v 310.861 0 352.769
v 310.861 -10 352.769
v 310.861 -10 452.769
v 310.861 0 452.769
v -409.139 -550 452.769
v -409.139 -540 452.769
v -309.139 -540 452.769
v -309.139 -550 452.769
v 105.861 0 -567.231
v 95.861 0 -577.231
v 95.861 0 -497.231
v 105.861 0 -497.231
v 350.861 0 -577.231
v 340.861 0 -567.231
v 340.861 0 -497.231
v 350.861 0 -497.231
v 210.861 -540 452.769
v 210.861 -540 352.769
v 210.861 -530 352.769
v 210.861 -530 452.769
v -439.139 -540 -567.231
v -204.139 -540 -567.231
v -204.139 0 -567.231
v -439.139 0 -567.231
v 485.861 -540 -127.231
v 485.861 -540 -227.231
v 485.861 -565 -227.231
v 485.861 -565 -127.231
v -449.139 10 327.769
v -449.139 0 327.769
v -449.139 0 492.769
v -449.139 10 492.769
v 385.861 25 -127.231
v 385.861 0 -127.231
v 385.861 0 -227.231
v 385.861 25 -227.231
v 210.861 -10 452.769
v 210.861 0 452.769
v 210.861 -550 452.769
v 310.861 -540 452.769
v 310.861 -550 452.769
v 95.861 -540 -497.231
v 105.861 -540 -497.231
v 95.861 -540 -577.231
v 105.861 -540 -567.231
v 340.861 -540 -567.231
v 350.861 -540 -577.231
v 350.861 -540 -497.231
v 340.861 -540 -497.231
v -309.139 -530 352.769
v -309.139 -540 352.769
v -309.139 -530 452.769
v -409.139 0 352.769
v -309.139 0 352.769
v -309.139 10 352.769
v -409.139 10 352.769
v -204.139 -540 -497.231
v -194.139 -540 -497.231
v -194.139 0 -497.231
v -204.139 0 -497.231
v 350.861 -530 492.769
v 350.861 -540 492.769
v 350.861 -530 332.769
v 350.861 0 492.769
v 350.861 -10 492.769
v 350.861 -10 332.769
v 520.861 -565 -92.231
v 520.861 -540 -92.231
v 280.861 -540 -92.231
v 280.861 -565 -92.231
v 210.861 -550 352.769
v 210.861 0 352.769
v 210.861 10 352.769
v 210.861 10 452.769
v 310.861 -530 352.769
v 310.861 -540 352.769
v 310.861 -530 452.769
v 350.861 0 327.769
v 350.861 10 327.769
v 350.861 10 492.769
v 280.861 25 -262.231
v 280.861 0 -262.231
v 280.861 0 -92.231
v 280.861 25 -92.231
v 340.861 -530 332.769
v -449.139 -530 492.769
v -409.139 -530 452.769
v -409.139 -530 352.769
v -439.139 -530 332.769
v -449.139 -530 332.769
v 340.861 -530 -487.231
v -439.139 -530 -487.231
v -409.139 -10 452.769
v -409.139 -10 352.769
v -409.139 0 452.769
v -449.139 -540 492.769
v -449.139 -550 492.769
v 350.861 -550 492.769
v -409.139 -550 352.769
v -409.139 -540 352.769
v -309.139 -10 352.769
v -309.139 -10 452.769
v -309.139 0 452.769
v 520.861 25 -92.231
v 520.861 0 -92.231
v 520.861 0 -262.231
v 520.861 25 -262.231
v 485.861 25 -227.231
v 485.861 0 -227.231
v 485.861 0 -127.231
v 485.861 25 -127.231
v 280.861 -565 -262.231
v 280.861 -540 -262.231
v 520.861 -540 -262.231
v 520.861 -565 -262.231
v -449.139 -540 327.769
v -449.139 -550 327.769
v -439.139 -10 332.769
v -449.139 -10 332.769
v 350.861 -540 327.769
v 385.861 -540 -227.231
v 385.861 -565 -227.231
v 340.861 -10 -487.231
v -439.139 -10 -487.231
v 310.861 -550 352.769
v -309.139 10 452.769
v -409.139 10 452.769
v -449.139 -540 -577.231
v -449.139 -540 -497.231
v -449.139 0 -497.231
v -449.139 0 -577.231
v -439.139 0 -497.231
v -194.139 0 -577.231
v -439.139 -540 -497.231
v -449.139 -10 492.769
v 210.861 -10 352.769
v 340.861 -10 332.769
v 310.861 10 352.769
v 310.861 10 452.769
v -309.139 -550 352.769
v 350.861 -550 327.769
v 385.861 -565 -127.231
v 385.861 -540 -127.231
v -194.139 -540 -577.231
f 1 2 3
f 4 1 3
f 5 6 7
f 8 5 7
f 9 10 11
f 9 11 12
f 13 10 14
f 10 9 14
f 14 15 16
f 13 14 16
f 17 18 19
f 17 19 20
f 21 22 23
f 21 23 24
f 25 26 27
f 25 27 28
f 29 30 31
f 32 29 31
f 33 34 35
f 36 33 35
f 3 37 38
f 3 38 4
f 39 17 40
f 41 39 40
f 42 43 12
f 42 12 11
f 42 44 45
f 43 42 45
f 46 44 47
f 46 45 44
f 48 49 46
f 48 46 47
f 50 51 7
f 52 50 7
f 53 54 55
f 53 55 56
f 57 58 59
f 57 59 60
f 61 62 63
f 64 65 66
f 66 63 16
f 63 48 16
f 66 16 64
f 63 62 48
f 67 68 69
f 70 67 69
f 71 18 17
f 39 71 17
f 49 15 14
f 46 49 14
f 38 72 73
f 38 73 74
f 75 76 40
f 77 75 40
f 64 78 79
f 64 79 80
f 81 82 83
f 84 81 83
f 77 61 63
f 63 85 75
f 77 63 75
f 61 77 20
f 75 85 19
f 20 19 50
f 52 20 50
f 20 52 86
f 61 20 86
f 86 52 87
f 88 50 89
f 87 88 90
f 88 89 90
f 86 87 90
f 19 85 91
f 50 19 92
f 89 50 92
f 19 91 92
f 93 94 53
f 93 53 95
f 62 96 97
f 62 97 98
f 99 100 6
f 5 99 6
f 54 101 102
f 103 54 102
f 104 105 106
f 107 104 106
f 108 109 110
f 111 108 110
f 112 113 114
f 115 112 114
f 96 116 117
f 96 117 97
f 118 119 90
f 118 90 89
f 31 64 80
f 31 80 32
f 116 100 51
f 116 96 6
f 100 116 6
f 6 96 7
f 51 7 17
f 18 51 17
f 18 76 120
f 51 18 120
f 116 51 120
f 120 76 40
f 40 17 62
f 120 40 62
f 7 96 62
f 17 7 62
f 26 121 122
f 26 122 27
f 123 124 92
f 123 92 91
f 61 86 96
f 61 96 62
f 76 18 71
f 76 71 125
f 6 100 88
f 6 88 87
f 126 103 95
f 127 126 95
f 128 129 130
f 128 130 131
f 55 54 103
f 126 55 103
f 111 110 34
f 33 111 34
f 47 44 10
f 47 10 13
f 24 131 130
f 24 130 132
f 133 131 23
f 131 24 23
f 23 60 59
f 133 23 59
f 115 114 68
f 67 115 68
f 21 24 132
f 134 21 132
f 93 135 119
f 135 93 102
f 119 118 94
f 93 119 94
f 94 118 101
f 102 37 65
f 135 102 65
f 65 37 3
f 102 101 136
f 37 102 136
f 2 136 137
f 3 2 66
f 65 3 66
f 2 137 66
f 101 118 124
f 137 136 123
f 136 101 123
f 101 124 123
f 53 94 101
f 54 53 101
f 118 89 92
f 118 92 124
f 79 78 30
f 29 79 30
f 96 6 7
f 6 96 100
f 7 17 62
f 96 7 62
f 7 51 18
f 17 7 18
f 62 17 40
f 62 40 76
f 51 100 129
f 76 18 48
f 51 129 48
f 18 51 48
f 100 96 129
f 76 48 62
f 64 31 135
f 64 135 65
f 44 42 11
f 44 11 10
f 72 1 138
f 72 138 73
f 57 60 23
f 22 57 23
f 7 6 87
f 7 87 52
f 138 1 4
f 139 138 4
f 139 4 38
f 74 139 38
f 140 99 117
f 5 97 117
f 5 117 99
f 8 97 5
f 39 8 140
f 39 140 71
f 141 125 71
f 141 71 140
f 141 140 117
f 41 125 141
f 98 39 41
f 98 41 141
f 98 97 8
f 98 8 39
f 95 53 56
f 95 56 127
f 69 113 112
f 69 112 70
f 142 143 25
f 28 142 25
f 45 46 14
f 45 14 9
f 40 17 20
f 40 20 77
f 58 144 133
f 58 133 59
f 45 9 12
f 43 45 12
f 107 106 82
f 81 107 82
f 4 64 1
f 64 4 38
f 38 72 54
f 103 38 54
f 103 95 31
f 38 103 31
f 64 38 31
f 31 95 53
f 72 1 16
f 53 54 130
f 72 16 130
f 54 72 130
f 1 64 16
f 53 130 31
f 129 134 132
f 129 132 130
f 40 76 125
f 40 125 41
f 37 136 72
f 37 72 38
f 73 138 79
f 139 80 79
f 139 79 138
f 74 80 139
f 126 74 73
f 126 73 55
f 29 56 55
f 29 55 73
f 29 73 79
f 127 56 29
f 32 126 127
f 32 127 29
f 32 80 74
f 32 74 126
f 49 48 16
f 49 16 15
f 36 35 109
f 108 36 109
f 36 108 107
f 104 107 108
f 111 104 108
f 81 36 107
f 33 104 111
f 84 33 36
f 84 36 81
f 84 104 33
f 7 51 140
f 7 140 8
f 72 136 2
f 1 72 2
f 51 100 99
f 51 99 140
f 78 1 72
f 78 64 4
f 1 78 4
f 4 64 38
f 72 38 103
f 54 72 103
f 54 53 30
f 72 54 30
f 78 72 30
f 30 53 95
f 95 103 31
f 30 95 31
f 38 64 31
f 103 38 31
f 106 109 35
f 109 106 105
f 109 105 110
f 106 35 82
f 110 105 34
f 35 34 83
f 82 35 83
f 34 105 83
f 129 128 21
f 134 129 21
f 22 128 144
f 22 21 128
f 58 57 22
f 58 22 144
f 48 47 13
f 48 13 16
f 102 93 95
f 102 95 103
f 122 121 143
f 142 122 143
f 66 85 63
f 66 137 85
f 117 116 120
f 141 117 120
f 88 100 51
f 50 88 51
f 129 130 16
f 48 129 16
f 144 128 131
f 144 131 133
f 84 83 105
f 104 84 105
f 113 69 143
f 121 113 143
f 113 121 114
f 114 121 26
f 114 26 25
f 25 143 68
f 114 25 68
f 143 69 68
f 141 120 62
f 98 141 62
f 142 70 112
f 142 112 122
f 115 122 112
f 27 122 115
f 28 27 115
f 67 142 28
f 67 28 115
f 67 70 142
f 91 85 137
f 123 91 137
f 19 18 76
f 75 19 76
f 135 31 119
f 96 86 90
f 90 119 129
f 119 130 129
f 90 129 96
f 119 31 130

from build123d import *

# Parameters (mm, degrees)
F0_W      = 800
F0_H      = 10
F1_DEPTH  = 540
F2_W      = 800
F2_H      = 540
F2_W_2    = 780
F2_H_2    = 520
F3_DEPTH  = 820
F5_DEPTH  = 160
F6_W      = 100
F6_H      = 100
F7_DEPTH  = 918
F8_W      = 800
F8_H      = 165
F8_W_2    = 100
F8_H_2    = 100
F9_DEPTH  = 10
F10_W     = 800
F10_H     = 165
F10_W_2   = 100
F10_H_2   = 100
F11_DEPTH = 10
F13_DEPTH = 540
F14_W     = 70
F14_H     = 170
F15_DEPTH = 25
F16_W     = 70
F16_H     = 170
F16_W_2   = 170
F16_W_3   = 100
F16_H_2   = 100
F17_DEPTH = 25


with BuildPart() as f1:
    # F0 (on Front) → F1 (new body)
    with BuildSketch(Plane.XZ):
        with Locations((-49.139143, -492.230605)):
            Rectangle(F0_W, F0_H)
    extrude(amount=F1_DEPTH)

    # F2 (on face) → F3 (join)
    with BuildSketch(Plane.XY.offset(-487.230605)):
        with Locations((-49.139143, -270)):
            Rectangle(F2_W, F2_H)
        with Locations((-49.139143, -270)):
            Rectangle(F2_W_2, F2_H_2, mode=Mode.SUBTRACT)
    extrude(amount=F3_DEPTH)

    # F4 (on face) → F5 (join)
    with BuildSketch(Plane.XY.offset(332.769395)):
        Polygon((350.860857, 0), (-449.139143, 0), (-449.139143, -10), (-439.139143, -10), (340.860857, -10), (350.860857, -10), align=None)
        Polygon((-439.139143, -530), (-449.139143, -530), (-449.139143, -540), (350.860857, -540), (350.860857, -530), (340.860857, -530), align=None)
    extrude(amount=F5_DEPTH)

    # F6 (on face) → F7 (cut)
    with BuildSketch(Plane.XZ.offset(540)):
        with Locations((-359.139143, 402.769395)):
            Rectangle(F6_W, F6_H)
        with Locations((260.860857, 402.769395)):
            Rectangle(F6_W, F6_H)
    extrude(amount=-F7_DEPTH, mode=Mode.SUBTRACT)


with BuildPart() as f9:
    # F8 (on face) → F9 (new body)
    with BuildSketch(Plane.XZ.offset(540)):
        with Locations((-49.139143, 410.269395)):
            Rectangle(F8_W, F8_H)
        with Locations((-359.139143, 402.769395)):
            Rectangle(F8_W_2, F8_H_2, mode=Mode.SUBTRACT)
        with Locations((260.860857, 402.769395)):
            Rectangle(F8_W_2, F8_H_2, mode=Mode.SUBTRACT)
    extrude(amount=F9_DEPTH)


with BuildPart() as f11:
    # F10 (on face) → F11 (new body)
    with BuildSketch(Plane(origin=(0, 0, 0), x_dir=(-1, 0, 0), z_dir=(0, 1, 0))):
        with Locations((49.139143, 410.269395)):
            Rectangle(F10_W, F10_H)
        with Locations((-260.860857, 402.769395)):
            Rectangle(F10_W_2, F10_H_2, mode=Mode.SUBTRACT)
        with Locations((359.139143, 402.769395)):
            Rectangle(F10_W_2, F10_H_2, mode=Mode.SUBTRACT)
    extrude(amount=F11_DEPTH)


with BuildPart() as f13:
    # F12 (on face) → F13 (new body, through all)
    with BuildSketch(Plane.XZ.offset(540)):
        Polygon((-439.139143, -497.230605), (-449.139143, -497.230605), (-449.139143, -577.230605), (-194.139143, -577.230605), (-194.139143, -497.230605), (-204.139143, -497.230605), (-204.139143, -567.230605), (-439.139143, -567.230605), align=None)
        Polygon((350.860857, -577.230605), (350.860857, -497.230605), (340.860857, -497.230605), (340.860857, -567.230605), (105.860857, -567.230605), (105.860857, -497.230605), (95.860857, -497.230605), (95.860857, -577.230605), align=None)
    extrude(amount=-F13_DEPTH)


with BuildPart() as f15:
    # F14 (on face) → F15 (new body)
    with BuildSketch(Plane(origin=(0, 0, 0), x_dir=(-1, 0, 0), z_dir=(0, 1, 0))):
        Polygon((-520.860857, -262.230605), (-350.860857, -262.230605), (-350.860857, -92.230605), (-435.860857, -92.230605), (-520.860857, -92.230605), align=None)
        Polygon((-485.860857, -127.230605), (-435.860857, -127.230605), (-385.860857, -127.230605), (-385.860857, -177.230605), (-385.860857, -227.230605), (-485.860857, -227.230605), (-485.860857, -177.230605), align=None, mode=Mode.SUBTRACT)
        with Locations((-315.860857, -177.230605)):
            Rectangle(F14_W, F14_H)
    extrude(amount=F15_DEPTH)


with BuildPart() as f17:
    # F16 (on face) → F17 (new body)
    with BuildSketch(Plane.XZ.offset(540)):
        with Locations((315.860857, -177.230605)):
            Rectangle(F16_W, F16_H)
        with Locations((435.860857, -177.230605)):
            Rectangle(F16_W_2, F16_H)
        with Locations((435.860857, -177.230605)):
            Rectangle(F16_W_3, F16_H_2, mode=Mode.SUBTRACT)
    extrude(amount=F17_DEPTH)


solid = Compound([f1.part, f9.part, f11.part, f13.part, f15.part, f17.part])
